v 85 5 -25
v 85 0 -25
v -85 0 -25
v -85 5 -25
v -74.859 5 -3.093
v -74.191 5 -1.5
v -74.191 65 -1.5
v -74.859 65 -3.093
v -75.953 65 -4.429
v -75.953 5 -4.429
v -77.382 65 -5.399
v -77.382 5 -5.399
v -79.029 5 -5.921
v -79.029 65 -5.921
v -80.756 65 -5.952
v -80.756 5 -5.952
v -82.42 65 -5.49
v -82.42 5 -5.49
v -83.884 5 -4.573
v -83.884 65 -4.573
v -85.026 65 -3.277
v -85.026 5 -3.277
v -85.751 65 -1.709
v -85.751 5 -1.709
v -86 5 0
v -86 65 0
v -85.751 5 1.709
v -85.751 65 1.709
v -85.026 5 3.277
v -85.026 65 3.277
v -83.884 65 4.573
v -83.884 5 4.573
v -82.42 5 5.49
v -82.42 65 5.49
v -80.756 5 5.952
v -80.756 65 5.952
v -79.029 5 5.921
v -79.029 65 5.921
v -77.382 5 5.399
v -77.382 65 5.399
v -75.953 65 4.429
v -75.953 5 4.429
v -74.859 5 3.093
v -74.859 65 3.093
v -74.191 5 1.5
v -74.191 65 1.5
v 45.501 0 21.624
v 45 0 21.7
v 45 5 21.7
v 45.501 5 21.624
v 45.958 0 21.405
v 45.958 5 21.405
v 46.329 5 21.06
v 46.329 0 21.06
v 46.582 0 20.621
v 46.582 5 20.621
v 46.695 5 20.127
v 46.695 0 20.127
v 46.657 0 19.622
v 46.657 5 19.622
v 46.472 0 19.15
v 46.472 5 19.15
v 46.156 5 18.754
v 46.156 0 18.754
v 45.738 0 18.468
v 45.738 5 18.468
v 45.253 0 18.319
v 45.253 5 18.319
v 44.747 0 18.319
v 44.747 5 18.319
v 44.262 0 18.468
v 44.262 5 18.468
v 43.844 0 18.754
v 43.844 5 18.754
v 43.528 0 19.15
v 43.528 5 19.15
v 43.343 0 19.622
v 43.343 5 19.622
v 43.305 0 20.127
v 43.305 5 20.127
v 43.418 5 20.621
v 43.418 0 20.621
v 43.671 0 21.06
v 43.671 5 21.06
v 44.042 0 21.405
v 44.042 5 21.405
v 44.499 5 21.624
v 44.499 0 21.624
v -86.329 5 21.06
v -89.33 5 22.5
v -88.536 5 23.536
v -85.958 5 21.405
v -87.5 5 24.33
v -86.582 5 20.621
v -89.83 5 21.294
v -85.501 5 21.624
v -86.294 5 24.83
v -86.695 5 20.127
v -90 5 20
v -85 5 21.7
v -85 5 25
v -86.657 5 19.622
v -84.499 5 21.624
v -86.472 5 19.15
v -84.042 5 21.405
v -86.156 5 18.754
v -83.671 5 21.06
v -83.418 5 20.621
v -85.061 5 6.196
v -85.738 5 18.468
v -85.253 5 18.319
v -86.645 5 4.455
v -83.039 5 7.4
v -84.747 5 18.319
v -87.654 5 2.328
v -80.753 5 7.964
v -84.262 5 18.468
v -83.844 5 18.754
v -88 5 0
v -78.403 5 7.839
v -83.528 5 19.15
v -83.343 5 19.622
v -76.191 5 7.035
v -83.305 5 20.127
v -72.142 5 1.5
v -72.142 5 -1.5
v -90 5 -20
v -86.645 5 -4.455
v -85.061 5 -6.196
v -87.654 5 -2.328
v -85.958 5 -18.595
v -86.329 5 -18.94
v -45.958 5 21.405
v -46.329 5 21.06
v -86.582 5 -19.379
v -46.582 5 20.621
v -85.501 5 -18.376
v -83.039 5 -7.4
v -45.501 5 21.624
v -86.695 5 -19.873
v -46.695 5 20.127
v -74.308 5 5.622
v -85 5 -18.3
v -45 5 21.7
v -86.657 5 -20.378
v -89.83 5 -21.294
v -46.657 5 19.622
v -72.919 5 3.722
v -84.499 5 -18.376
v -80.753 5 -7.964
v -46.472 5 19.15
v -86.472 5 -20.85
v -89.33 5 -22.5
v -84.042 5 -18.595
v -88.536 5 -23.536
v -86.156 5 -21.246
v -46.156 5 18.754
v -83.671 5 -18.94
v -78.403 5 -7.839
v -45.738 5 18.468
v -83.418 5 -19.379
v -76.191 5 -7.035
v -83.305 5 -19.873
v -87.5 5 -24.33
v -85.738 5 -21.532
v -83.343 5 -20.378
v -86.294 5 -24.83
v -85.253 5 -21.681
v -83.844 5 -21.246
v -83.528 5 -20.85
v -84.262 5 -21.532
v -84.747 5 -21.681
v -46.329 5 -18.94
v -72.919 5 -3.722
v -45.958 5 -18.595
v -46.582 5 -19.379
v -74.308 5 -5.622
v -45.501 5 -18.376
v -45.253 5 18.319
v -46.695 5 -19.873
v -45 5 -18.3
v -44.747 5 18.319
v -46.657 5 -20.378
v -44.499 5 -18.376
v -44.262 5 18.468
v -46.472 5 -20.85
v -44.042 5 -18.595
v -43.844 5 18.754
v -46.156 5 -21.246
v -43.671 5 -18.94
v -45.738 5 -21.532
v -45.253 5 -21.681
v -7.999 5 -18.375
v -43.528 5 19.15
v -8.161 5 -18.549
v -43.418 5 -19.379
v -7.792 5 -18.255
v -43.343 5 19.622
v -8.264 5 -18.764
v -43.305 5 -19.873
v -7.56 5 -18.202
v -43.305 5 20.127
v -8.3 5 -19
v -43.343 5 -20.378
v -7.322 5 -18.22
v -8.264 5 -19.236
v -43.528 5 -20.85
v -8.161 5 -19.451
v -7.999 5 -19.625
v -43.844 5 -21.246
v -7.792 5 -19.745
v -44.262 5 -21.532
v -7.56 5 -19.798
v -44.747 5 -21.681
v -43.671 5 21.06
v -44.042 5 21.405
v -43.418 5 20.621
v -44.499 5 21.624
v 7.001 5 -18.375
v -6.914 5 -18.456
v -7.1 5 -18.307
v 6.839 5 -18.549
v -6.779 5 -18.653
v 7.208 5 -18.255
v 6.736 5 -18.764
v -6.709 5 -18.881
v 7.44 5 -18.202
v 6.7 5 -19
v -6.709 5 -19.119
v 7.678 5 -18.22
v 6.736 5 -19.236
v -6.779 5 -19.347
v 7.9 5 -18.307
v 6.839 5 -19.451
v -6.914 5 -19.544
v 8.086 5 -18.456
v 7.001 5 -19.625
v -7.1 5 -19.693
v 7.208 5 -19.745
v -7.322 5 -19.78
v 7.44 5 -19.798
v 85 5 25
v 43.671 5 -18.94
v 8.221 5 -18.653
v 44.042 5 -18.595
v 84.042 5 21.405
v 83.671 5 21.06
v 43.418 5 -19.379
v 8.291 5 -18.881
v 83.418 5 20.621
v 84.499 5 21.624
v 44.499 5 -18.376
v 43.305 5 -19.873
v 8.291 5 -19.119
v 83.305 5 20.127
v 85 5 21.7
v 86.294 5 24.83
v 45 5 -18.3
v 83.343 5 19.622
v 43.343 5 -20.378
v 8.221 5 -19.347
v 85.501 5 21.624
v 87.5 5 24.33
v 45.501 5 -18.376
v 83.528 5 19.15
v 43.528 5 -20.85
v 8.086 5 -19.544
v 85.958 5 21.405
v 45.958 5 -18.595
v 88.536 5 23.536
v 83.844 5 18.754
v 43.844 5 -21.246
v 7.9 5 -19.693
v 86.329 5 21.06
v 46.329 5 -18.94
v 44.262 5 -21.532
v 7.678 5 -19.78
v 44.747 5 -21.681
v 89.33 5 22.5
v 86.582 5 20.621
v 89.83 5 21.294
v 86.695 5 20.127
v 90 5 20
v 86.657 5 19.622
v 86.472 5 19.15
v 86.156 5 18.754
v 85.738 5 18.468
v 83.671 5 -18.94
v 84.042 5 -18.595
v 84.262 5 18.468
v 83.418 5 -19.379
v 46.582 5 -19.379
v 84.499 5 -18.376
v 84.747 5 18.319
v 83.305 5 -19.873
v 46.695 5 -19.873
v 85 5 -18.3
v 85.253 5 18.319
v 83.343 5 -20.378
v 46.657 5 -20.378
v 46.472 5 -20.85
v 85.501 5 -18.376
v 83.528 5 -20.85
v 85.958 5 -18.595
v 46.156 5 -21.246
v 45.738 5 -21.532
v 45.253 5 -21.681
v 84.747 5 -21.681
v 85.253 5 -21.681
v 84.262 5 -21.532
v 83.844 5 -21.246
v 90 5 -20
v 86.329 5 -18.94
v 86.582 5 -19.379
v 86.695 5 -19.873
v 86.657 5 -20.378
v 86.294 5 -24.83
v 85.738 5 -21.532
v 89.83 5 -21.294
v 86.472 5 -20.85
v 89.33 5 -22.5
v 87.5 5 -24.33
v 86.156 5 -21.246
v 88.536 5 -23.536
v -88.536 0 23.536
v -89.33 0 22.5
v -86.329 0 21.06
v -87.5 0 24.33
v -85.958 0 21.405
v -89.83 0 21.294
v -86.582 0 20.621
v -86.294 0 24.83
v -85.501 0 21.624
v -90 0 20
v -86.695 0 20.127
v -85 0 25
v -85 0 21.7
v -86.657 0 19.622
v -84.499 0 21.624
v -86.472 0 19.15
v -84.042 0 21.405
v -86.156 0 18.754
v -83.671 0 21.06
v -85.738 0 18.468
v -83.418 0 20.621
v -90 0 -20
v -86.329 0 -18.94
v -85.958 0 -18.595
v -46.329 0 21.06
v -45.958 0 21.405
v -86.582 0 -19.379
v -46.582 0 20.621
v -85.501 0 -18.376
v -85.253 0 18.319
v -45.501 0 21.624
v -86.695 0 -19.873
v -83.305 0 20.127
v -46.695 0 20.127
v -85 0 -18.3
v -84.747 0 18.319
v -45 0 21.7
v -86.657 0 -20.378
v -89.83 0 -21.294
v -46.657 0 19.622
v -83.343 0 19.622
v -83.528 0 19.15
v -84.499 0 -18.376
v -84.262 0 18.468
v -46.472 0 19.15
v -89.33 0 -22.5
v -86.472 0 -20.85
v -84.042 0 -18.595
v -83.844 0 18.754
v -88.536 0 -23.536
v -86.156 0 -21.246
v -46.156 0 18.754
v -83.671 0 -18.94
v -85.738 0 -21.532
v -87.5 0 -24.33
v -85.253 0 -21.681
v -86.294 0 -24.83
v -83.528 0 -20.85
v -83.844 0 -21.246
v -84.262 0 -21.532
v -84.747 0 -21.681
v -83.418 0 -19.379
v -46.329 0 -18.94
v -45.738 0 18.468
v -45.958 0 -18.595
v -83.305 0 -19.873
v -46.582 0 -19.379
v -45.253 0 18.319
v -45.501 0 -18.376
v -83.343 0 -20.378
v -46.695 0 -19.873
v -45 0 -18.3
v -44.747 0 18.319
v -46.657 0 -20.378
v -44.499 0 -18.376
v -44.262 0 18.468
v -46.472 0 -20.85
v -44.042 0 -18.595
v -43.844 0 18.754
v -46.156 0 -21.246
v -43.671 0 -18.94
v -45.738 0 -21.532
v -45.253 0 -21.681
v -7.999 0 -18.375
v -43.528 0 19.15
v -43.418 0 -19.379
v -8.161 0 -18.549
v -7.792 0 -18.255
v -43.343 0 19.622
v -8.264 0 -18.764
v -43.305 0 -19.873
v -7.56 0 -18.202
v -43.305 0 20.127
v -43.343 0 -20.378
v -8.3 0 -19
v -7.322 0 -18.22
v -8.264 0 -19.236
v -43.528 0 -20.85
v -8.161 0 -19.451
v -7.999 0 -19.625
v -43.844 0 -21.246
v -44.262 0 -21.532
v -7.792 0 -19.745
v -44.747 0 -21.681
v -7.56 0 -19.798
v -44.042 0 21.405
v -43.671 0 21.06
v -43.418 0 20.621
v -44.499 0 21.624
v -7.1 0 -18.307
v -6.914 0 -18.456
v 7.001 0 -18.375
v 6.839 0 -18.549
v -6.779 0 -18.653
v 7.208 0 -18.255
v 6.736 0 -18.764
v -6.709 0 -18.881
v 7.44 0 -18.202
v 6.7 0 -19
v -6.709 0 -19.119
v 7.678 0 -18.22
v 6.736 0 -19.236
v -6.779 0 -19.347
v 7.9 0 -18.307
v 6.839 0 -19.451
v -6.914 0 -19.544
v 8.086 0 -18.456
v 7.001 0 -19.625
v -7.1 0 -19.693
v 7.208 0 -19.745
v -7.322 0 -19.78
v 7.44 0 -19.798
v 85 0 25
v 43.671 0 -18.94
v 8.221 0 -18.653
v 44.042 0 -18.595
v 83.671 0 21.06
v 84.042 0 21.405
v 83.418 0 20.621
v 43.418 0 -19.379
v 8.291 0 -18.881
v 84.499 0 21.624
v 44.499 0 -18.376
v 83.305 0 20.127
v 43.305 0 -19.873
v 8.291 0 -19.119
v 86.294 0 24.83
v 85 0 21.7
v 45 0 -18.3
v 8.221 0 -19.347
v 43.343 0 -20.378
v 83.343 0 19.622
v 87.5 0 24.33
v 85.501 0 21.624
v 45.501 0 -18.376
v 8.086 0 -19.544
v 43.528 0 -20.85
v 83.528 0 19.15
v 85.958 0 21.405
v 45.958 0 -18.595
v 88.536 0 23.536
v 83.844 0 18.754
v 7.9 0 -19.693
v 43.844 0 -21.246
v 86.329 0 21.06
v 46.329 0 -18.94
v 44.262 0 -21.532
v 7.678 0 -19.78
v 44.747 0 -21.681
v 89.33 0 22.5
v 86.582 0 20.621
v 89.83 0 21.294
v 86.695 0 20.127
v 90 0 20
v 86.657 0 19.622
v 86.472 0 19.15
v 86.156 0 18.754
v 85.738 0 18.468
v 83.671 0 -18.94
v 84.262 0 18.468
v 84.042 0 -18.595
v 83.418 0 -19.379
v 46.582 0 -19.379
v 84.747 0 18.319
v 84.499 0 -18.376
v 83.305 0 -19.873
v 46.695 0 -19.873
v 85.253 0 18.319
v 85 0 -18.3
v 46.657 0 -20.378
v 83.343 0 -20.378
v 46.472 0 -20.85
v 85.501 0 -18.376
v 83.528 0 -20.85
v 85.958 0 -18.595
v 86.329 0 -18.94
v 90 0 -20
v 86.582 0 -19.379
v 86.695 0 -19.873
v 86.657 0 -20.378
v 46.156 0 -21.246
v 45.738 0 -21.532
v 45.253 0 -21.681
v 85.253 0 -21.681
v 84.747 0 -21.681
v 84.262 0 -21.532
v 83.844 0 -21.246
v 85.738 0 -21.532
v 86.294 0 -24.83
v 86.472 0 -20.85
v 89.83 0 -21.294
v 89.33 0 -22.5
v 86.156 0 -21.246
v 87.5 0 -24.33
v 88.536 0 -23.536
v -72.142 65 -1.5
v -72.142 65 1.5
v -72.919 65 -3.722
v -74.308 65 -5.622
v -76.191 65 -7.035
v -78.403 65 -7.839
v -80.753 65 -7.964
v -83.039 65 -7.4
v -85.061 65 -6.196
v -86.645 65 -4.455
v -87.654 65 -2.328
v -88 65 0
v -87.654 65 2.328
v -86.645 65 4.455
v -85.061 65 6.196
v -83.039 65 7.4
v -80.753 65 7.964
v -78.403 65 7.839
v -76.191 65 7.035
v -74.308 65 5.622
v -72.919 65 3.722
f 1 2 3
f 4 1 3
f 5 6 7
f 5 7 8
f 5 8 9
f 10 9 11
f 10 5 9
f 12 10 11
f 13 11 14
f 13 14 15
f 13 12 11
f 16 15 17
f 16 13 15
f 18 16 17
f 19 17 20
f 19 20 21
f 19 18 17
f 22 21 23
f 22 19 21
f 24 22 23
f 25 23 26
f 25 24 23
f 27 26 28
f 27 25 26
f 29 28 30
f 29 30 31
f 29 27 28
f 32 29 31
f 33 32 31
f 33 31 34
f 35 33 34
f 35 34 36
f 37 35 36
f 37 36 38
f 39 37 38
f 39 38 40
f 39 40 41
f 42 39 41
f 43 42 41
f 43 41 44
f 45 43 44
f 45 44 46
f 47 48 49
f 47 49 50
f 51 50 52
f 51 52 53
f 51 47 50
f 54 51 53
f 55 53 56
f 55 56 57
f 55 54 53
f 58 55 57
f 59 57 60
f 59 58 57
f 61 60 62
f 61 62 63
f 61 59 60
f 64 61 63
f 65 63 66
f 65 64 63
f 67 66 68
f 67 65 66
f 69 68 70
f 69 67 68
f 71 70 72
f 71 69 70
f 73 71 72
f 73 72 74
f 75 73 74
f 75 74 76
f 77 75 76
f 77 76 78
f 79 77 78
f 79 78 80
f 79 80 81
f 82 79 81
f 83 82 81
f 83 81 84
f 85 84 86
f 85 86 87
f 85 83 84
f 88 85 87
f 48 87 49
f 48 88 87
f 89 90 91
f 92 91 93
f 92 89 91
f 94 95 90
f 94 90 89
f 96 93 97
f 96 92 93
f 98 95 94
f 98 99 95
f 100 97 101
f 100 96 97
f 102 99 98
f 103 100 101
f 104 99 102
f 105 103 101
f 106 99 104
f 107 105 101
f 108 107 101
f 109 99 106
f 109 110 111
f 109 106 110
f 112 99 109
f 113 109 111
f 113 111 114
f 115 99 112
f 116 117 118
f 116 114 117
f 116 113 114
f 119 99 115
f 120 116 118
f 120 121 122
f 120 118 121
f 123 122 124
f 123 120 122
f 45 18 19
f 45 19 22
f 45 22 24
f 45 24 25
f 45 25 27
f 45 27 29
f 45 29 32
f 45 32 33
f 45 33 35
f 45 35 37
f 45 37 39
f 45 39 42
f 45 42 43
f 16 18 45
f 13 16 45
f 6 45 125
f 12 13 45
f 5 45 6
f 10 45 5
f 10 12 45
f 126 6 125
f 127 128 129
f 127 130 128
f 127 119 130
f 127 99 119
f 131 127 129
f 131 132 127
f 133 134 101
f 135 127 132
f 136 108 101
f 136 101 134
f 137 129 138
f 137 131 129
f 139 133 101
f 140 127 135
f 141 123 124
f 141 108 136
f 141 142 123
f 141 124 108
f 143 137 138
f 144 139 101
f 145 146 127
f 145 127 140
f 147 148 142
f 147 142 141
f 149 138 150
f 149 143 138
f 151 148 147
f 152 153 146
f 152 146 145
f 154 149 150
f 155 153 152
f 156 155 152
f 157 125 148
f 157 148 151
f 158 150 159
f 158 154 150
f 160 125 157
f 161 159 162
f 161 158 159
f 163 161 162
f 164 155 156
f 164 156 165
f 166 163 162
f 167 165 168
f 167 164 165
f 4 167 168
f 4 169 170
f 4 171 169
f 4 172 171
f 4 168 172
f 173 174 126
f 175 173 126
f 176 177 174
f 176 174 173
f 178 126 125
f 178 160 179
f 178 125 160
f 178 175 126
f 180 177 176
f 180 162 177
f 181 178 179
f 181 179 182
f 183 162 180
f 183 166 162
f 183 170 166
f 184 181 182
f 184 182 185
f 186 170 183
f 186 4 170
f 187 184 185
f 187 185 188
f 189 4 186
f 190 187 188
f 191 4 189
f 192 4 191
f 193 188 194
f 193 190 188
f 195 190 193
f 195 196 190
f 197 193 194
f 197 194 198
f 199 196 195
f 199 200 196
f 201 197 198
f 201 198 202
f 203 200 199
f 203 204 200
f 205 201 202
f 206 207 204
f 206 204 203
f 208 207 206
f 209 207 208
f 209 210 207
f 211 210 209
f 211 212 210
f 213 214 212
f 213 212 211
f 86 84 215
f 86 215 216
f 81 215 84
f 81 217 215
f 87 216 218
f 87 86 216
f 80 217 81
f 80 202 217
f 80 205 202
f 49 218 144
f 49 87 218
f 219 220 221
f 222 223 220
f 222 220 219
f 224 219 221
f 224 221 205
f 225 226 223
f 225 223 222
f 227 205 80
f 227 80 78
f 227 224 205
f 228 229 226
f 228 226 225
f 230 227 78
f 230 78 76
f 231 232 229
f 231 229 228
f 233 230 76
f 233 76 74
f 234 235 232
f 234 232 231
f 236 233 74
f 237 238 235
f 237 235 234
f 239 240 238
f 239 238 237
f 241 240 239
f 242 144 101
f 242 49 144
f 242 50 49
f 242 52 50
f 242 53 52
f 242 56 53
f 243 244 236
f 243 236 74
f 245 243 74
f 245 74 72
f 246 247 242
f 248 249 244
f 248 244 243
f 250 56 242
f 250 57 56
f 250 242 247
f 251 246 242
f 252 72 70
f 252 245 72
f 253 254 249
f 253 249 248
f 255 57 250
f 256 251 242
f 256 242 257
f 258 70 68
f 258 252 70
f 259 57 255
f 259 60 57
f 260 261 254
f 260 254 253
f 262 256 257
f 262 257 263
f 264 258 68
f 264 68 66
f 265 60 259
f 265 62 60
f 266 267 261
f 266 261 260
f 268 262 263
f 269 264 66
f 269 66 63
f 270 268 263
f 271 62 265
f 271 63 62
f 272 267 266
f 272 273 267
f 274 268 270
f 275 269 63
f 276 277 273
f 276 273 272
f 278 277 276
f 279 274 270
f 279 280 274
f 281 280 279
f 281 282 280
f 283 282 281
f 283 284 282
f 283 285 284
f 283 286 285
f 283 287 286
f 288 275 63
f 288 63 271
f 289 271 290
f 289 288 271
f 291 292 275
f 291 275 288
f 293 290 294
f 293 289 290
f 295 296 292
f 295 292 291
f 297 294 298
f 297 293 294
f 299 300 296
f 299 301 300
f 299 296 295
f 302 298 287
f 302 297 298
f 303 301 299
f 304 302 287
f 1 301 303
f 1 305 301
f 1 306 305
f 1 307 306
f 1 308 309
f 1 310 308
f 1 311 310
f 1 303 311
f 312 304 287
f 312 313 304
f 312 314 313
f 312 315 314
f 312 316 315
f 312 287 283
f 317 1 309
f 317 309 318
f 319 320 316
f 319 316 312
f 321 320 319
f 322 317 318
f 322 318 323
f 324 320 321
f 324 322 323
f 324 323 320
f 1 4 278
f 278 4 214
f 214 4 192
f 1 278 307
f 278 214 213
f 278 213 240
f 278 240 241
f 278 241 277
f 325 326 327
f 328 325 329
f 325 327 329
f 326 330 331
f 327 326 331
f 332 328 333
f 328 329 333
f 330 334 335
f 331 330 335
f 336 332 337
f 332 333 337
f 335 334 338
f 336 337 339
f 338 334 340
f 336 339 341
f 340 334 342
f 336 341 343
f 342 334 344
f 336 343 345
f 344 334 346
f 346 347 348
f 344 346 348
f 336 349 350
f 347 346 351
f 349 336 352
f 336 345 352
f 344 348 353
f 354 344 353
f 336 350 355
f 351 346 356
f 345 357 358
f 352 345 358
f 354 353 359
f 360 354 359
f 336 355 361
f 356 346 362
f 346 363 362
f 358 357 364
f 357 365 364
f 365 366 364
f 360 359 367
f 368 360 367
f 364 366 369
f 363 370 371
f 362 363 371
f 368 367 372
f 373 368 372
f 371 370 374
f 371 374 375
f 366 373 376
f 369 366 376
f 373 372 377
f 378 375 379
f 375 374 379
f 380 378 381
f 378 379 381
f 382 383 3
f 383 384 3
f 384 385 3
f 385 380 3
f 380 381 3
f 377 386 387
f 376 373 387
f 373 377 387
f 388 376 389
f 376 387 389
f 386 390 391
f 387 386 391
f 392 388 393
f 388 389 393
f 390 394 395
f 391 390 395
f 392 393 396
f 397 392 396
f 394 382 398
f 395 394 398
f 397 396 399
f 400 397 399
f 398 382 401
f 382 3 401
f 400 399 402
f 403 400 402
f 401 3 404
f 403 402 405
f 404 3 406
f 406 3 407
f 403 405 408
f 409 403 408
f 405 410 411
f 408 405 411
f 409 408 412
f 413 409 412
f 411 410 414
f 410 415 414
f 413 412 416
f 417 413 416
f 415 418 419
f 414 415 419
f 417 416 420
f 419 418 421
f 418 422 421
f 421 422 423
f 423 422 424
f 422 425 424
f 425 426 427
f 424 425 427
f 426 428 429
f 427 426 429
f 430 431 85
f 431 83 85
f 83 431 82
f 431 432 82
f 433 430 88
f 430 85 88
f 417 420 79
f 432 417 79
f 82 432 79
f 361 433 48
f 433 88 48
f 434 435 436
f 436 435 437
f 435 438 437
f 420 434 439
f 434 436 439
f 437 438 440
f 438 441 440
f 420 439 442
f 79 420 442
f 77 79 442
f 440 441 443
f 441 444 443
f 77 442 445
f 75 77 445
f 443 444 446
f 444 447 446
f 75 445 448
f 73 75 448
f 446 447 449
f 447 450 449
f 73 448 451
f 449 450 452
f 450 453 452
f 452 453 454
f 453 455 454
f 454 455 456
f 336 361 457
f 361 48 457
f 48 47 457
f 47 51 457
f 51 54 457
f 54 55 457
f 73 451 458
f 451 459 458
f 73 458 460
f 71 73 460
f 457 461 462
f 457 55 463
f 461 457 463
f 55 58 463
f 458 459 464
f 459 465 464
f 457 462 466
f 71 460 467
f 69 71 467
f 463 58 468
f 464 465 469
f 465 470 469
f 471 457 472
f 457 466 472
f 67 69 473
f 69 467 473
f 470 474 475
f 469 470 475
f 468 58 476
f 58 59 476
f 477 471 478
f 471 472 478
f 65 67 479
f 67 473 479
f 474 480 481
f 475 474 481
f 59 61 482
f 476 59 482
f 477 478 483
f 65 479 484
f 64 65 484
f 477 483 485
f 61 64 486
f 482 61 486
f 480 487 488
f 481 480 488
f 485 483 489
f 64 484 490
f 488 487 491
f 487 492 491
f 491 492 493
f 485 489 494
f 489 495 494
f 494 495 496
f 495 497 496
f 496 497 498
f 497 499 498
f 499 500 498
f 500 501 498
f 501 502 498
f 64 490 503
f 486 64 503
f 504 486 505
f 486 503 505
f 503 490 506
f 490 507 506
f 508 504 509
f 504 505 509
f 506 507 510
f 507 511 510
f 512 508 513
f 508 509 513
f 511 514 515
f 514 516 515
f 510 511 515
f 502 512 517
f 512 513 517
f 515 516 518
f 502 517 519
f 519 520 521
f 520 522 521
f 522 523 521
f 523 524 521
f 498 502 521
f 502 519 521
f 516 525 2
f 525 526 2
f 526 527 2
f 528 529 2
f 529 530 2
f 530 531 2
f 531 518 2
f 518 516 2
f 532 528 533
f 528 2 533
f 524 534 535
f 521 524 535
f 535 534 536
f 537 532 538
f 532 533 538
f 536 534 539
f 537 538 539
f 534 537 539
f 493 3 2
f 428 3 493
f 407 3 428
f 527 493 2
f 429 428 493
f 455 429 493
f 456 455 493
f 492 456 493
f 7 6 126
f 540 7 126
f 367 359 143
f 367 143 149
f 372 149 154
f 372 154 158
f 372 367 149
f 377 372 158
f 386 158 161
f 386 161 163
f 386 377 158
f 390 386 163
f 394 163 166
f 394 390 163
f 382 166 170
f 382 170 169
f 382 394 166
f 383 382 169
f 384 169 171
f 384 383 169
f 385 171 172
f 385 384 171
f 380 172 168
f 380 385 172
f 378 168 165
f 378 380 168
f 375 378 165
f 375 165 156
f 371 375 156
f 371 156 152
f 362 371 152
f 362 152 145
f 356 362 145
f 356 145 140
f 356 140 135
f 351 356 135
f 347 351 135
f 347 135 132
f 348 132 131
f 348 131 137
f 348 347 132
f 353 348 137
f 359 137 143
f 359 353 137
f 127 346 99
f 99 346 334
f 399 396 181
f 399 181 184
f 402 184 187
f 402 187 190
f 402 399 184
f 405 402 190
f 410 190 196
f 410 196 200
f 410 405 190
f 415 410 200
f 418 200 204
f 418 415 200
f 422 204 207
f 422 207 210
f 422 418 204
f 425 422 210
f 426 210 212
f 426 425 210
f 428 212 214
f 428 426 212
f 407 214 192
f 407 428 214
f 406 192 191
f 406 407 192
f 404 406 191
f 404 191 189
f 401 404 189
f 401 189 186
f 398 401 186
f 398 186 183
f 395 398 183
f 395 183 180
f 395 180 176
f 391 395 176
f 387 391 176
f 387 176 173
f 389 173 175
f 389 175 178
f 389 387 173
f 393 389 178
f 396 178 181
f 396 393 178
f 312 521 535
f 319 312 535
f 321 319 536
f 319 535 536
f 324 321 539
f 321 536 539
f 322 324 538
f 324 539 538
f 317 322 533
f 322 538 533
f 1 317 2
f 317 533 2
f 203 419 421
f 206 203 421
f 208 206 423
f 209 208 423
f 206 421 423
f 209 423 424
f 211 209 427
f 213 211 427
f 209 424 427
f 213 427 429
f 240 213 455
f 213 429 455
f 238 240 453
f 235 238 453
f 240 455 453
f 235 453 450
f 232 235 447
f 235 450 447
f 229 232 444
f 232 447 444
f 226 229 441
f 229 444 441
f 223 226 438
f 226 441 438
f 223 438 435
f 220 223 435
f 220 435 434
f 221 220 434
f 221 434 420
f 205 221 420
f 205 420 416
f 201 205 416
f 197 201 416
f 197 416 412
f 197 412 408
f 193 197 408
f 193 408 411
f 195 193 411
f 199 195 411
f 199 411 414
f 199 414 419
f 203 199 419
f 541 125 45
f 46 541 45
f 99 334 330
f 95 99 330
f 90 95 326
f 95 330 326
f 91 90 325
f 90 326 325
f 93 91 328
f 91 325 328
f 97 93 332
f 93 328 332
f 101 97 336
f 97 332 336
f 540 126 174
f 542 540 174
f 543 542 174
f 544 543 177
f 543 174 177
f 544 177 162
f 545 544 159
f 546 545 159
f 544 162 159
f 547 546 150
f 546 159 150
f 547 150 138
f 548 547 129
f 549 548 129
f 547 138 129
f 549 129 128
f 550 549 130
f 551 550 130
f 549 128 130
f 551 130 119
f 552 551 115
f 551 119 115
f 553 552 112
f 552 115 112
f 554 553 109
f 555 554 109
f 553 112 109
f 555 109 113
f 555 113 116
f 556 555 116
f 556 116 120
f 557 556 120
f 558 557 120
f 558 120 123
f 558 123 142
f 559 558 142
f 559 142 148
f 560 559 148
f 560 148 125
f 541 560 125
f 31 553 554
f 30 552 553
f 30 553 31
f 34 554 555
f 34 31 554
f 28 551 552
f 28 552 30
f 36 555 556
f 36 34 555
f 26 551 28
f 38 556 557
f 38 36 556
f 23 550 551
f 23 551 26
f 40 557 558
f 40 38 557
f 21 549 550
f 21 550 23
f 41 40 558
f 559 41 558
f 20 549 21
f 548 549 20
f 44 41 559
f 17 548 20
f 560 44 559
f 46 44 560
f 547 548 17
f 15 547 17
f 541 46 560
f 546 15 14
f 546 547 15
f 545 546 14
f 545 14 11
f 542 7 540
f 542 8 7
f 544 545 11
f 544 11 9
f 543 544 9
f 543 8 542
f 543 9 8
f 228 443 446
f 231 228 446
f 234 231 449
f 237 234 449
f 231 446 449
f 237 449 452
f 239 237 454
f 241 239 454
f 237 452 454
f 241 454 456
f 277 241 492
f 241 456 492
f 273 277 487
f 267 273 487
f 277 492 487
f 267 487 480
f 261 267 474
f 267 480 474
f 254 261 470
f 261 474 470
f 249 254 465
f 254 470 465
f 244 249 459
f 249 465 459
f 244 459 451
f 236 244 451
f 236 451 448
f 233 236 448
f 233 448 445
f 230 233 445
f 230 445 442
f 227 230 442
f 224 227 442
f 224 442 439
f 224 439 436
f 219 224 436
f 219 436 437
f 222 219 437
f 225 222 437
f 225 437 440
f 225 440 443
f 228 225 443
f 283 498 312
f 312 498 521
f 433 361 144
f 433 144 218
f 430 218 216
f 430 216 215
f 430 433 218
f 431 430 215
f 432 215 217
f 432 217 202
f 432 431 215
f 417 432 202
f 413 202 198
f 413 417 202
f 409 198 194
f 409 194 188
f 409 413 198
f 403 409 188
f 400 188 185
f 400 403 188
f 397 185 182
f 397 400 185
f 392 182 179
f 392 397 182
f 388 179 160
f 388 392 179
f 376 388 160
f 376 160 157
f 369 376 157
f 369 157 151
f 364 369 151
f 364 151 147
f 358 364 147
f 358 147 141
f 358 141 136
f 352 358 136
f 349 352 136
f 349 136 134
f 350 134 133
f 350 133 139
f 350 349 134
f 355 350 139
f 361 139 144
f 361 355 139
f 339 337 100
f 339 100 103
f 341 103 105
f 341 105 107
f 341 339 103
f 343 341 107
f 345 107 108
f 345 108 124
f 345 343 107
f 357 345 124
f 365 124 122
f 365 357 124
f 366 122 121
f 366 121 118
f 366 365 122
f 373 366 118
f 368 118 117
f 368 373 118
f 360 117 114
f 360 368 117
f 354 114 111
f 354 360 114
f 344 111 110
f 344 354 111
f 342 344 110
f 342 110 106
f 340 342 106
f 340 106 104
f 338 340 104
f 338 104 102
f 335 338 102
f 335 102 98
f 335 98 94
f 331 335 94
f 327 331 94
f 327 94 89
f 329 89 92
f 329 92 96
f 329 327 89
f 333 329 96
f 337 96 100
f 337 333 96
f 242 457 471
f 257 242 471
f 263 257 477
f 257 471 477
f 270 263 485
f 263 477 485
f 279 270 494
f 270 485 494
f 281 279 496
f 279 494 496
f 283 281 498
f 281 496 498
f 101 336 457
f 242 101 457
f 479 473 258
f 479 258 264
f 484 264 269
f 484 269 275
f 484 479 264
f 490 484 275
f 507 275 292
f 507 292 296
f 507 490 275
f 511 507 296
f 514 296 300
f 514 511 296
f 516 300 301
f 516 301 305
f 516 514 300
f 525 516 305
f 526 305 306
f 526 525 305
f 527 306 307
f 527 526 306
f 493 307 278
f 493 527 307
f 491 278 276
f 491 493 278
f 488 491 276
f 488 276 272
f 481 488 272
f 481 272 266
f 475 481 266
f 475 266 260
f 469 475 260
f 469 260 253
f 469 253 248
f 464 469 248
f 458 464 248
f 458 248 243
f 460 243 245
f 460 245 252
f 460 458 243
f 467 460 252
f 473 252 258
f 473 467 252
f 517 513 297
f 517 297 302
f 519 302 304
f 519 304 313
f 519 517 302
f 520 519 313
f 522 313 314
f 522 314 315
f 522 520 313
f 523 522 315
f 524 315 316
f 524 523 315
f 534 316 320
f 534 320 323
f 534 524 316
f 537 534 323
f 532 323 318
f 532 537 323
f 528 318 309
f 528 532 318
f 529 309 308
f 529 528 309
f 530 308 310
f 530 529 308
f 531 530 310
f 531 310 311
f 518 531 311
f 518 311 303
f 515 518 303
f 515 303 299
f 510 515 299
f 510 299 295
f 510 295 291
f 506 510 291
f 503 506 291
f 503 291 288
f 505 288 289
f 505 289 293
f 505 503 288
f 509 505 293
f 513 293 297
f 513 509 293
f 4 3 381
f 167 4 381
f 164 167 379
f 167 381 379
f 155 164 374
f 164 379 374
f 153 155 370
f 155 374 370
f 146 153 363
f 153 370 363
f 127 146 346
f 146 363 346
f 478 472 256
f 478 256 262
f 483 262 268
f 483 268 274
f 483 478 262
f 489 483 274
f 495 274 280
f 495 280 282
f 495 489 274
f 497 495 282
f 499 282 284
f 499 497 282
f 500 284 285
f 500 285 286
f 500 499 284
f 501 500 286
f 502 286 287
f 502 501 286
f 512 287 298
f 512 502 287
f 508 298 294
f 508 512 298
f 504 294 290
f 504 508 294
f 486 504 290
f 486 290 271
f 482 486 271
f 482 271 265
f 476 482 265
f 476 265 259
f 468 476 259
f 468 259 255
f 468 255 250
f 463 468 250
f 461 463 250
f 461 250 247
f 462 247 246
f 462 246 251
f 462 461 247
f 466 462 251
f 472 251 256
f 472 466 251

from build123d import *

# Parameters (mm, degrees)
SKETCH_1_W          = 100
SKETCH_1_H          = 50
SKETCH_1_R          = 1.7
EXTRUDE_1_DEPTH     = 5
HOLE_WIZARD_M2_2_D  = 1.6
SKETCH_8_R          = 8
SKETCH_8_R_2        = 6
EXTRUDE_1_2_DEPTH   = 60
CUT_EXTRUDE_START   = -60
CUT_EXTRUDE_1_DEPTH = 60


with BuildPart() as part:
    # 草图1 → Extrude 1 (new body)
    # profile 1 of 3: a face of its own
    with BuildSketch(Plane(origin=(0, 0, 0), x_dir=(1, 0, 0), z_dir=(0, 1, 0))):
        Rectangle(SKETCH_1_W, SKETCH_1_H)
        with Locations(Location((-45, -20, 0), (0, 0, 270))):
            Circle(SKETCH_1_R, mode=Mode.SUBTRACT)
        with Locations(Location((45, -20, 0), (0, 0, 270))):
            Circle(SKETCH_1_R, mode=Mode.SUBTRACT)
        with Locations(Location((-45, 20, 0), (0, 0, 270))):
            Circle(SKETCH_1_R, mode=Mode.SUBTRACT)
        with Locations(Location((45, 20, 0), (0, 0, 270))):
            Circle(SKETCH_1_R, mode=Mode.SUBTRACT)
    # profile 2 of 3: a face of its own
    with BuildSketch(Plane(origin=(0, 0, 0), x_dir=(1, 0, 0), z_dir=(0, 1, 0))):
        with BuildLine():
            Line((-50, 25), (-85, 25))
            ThreePointArc((-85, 25), (-88.535533906, 23.535533906), (-90, 20))
            Line((-90, 20), (-90, -20))
            ThreePointArc((-90, -20), (-88.535533906, -23.535533906), (-85, -25))
            Line((-85, -25), (-50, -25))
            Line((-50, -25), (-50, 25))
        make_face()
        with Locations(Location((-85, -20, 0), (0, 0, 270))):
            Circle(SKETCH_1_R, mode=Mode.SUBTRACT)
        with Locations(Location((-85, 20, 0), (0, 0, 270))):
            Circle(SKETCH_1_R, mode=Mode.SUBTRACT)
    # profile 3 of 3: a face of its own
    with BuildSketch(Plane(origin=(0, 0, 0), x_dir=(1, 0, 0), z_dir=(0, 1, 0))):
        with BuildLine():
            Line((85, 25), (50, 25))
            Line((50, 25), (50, -25))
            Line((50, -25), (85, -25))
            ThreePointArc((85, -25), (88.535533906, -23.535533906), (90, -20))
            Line((90, -20), (90, 20))
            ThreePointArc((90, 20), (88.535533906, 23.535533906), (85, 25))
        make_face()
        with Locations(Location((85, -20, 0), (0, 0, 270))):
            Circle(SKETCH_1_R, mode=Mode.SUBTRACT)
        with Locations(Location((85, 20, 0), (0, 0, 270))):
            Circle(SKETCH_1_R, mode=Mode.SUBTRACT)
    extrude(amount=EXTRUDE_1_DEPTH)

    # M2 螺纹孔2 (through all)
    with Locations(Plane(origin=(0, 5, 0), x_dir=(1, 0, 0), z_dir=(0, 1, 0))):
        with Locations((-7.5, 19), (7.5, 19)):
            Hole(HOLE_WIZARD_M2_2_D / 2)

    # 草图8 → Extrude 1 2 (add)
    with BuildSketch(Plane(origin=(0, 5, 0), x_dir=(1, 0, 0), z_dir=(0, 1, 0))):
        with Locations((-80, 0)):
            Circle(SKETCH_8_R)
        with Locations((-80, 0)):
            Circle(SKETCH_8_R_2, mode=Mode.SUBTRACT)
    extrude(amount=EXTRUDE_1_2_DEPTH)

    # 草图9 → 切除-拉伸1 (cut)
    with BuildSketch(Plane(origin=(0, 65, 0), x_dir=(1, 0, 0), z_dir=(0, 1, 0)).offset(CUT_EXTRUDE_START)):
        with BuildLine():
            Line((-74.190524981, 1.5), (-72.141883177, 1.5))
            ThreePointArc((-72.141883177, 1.5), (-72, 0), (-72.141883177, -1.5))
            Line((-72.141883177, -1.5), (-74.190524981, -1.5))
            ThreePointArc((-74.190524981, -1.5), (-74, 0), (-74.190524981, 1.5))
        make_face()
    extrude(amount=CUT_EXTRUDE_1_DEPTH, mode=Mode.SUBTRACT)


solid = part.part
